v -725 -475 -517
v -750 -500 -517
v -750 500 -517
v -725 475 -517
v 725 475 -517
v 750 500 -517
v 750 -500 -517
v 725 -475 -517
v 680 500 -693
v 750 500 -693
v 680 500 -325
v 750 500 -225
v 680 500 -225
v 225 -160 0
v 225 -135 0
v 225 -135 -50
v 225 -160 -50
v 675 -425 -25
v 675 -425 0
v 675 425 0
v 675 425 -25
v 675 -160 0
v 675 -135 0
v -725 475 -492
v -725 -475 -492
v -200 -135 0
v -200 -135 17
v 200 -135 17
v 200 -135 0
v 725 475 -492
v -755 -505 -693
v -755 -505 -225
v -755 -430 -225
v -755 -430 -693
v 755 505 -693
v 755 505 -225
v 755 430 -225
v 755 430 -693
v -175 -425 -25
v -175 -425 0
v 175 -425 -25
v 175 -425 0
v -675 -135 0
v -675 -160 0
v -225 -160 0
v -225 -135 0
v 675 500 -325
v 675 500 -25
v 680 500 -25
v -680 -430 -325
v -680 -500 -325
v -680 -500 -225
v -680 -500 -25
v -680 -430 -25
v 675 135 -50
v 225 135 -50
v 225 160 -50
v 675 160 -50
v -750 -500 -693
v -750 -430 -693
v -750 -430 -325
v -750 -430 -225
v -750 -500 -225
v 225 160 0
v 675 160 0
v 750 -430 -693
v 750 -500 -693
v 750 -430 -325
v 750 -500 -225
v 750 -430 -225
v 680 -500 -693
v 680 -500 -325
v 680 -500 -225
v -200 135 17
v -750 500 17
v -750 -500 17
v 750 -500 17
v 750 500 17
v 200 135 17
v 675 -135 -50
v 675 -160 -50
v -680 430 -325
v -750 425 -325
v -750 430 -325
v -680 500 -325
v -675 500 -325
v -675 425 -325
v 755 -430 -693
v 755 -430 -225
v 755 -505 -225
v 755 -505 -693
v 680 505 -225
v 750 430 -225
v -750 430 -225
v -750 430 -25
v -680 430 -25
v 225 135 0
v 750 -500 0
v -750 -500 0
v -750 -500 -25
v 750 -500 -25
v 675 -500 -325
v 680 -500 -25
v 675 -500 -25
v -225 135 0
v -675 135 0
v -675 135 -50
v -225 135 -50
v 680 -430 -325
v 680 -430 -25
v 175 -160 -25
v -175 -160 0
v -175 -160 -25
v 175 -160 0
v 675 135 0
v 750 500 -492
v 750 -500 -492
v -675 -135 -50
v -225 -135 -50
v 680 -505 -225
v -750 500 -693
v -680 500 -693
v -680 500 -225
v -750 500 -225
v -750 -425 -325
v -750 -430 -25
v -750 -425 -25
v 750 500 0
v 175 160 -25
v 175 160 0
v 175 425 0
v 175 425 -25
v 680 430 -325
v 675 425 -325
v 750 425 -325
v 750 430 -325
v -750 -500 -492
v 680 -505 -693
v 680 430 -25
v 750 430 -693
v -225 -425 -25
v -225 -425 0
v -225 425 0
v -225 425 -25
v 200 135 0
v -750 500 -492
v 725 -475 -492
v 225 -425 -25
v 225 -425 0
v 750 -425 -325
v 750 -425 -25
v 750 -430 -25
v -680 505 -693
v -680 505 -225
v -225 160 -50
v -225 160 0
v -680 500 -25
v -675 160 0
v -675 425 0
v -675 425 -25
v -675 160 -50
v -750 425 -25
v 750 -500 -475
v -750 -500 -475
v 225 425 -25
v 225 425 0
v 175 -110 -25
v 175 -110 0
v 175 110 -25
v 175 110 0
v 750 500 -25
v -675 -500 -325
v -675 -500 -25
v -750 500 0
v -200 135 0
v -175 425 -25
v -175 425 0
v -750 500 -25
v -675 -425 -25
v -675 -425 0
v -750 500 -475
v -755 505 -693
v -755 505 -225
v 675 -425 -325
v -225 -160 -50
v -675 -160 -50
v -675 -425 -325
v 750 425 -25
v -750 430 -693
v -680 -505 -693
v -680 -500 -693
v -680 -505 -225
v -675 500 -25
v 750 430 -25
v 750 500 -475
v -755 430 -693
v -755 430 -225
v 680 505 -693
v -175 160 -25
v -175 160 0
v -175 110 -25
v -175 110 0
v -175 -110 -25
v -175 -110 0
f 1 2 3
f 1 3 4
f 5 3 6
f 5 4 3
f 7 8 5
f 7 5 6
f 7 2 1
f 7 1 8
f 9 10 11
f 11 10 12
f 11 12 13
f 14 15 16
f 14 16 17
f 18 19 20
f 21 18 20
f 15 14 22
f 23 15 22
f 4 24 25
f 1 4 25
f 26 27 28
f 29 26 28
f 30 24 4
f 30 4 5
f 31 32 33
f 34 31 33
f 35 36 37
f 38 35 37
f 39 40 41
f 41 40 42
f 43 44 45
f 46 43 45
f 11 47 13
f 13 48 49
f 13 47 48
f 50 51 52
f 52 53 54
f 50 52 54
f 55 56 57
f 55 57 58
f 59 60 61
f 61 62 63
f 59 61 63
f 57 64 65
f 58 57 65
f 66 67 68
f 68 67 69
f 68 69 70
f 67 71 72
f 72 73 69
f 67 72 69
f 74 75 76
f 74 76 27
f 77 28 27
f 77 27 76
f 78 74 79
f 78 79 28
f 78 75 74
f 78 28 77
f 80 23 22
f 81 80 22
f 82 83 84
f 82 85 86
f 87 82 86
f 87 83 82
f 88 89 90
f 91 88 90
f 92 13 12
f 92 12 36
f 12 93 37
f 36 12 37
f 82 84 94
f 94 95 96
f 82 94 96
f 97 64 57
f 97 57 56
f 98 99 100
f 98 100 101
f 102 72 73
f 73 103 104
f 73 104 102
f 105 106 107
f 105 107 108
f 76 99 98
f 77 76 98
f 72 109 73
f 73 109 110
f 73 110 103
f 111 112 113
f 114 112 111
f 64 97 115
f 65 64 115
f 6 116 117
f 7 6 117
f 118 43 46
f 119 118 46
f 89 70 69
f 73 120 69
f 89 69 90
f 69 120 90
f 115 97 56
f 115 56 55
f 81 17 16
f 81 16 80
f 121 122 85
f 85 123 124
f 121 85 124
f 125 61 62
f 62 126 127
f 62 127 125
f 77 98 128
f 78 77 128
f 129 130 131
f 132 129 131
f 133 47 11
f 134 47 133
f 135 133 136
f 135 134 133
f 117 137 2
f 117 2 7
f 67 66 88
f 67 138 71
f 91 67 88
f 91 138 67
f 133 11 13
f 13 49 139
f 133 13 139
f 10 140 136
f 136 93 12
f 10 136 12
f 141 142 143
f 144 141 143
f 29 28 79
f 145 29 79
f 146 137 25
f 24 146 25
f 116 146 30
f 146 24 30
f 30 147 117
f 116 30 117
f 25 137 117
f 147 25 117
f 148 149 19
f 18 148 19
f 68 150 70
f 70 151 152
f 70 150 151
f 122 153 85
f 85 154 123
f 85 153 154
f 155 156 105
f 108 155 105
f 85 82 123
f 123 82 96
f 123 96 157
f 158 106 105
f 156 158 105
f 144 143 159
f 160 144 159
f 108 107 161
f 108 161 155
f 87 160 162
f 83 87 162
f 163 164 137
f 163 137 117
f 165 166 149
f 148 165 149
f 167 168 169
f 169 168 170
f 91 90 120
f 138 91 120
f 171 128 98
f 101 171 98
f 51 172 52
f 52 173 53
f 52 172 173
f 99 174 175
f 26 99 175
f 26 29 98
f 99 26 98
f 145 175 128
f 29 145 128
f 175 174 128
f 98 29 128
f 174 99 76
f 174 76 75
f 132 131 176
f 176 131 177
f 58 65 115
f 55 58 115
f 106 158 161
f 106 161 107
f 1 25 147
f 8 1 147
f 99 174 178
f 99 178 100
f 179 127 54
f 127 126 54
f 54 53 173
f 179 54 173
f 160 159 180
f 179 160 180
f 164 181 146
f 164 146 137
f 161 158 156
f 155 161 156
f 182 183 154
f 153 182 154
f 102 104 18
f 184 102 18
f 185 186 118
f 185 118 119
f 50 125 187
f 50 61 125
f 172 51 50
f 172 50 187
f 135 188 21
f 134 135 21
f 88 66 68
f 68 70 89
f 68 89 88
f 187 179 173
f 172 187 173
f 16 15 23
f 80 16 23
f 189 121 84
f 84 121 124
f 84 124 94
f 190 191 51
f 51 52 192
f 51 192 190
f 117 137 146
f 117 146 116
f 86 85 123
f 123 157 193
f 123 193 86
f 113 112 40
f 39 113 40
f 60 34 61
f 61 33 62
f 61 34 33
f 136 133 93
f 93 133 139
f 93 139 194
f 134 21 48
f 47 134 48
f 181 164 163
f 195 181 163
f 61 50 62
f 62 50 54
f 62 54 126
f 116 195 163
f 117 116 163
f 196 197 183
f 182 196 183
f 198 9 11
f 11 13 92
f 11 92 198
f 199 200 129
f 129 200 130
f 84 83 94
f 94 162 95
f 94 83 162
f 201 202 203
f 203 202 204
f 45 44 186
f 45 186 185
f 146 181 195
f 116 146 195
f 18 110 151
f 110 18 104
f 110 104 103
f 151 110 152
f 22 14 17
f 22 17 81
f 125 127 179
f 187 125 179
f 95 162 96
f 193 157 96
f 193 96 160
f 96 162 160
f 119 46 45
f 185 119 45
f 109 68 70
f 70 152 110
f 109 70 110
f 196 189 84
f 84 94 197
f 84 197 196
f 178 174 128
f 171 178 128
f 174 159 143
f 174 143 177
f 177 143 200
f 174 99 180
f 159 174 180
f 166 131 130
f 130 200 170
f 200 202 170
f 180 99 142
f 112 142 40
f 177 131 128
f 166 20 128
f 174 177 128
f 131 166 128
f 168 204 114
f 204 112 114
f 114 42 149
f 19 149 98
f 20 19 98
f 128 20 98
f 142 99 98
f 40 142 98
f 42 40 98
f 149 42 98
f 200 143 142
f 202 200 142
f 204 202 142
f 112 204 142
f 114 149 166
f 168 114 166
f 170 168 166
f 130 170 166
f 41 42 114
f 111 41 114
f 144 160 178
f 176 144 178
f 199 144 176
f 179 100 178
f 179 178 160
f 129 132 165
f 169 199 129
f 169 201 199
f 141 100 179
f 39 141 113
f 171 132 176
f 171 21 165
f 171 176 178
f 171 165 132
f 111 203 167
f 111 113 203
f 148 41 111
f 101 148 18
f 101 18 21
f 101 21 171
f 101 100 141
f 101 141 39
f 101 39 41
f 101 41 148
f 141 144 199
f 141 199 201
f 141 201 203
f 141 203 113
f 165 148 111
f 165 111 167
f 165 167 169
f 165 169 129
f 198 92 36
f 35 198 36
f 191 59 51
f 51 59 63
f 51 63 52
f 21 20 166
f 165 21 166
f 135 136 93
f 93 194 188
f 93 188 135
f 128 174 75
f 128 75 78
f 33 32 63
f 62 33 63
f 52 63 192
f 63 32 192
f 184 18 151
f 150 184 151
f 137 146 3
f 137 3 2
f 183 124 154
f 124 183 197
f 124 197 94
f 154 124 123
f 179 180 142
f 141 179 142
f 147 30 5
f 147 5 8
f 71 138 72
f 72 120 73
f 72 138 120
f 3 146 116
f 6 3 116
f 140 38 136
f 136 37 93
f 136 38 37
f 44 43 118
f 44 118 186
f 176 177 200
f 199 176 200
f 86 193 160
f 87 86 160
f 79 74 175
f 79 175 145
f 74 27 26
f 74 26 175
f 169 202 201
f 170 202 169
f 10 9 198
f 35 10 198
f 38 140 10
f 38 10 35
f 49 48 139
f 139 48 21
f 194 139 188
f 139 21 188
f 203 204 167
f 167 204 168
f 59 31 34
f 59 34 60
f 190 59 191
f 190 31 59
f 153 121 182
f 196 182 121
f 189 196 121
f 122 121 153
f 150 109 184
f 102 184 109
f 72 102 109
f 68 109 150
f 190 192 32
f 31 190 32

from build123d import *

# Parameters (mm, degrees)
F0_W      = 1500
F0_H      = 1000
F1_DEPTH  = 17
F2_W      = 1500
F2_H      = 1000
F2_W_2    = 350
F2_H_2    = 50
F3_DEPTH  = 25
F2_W_3    = 450
F2_H_3    = 25
F4_DEPTH  = 50
F5_W      = 400
F5_H      = 270
F6_DEPTH  = 17
F8_DEPTH  = 300
F11_DEPTH = 468
F13_W     = 1500
F13_H     = 1000
F14_DEPTH = 17
F15_W     = 1500
F15_H     = 1000
F15_W_2   = 1450
F15_H_2   = 950
F16_DEPTH = 25


with BuildPart() as f1:
    # F0 (on Top) → F1 (new body)
    with BuildSketch(Plane.XY):
        Rectangle(F0_W, F0_H)
    extrude(amount=F1_DEPTH)

    # F5 (on face) → F6 (cut, through all)
    with BuildSketch(Plane.XY.offset(17)):
        Rectangle(F5_W, F5_H)
    extrude(amount=-F6_DEPTH, mode=Mode.SUBTRACT)


with BuildPart() as f3:
    # F2 (on face) → F3 (new body)
    with BuildSketch(Plane(origin=(0, 0, 0), x_dir=(1, 0, 0), z_dir=(0, 0, -1))):
        Rectangle(F2_W, F2_H)
        Polygon((225, 425), (675, 425), (675, 160), (675, 135), (675, -135), (675, -160), (675, -425), (225, -425), (175, -425), (-175, -425), (-225, -425), (-675, -425), (-675, -160), (-675, -135), (-675, 135), (-675, 160), (-675, 425), (-225, 425), (-175, 425), (175, 425), align=None, mode=Mode.SUBTRACT)
        Polygon((-175, 160), (-175, 425), (-225, 425), (-225, 160), (-225, 135), (-225, -135), (-225, -160), (-225, -425), (-175, -425), (-175, -160), (-175, -110), (-175, 110), align=None)
        Polygon((225, 160), (225, 425), (175, 425), (175, 160), (175, 110), (175, -110), (175, -160), (175, -425), (225, -425), (225, -160), (225, -135), (225, 135), align=None)
        with Locations((0, 135)):
            Rectangle(F2_W_2, F2_H_2)
        with Locations((0, -135)):
            Rectangle(F2_W_2, F2_H_2)
    extrude(amount=F3_DEPTH)


with BuildPart() as f4:
    # F2 (on face) → F4 (new body)
    with BuildSketch(Plane(origin=(0, 0, 0), x_dir=(1, 0, 0), z_dir=(0, 0, -1))):
        with Locations((-450, 147.5)):
            Rectangle(F2_W_3, F2_H_3)
    extrude(amount=F4_DEPTH)


with BuildPart() as f4b:
    # F2 (on face) → F4, piece 2 (new body)
    with BuildSketch(Plane(origin=(0, 0, 0), x_dir=(1, 0, 0), z_dir=(0, 0, -1))):
        with Locations((-450, -147.5)):
            Rectangle(F2_W_3, F2_H_3)
    extrude(amount=F4_DEPTH)


with BuildPart() as f4c:
    # F2 (on face) → F4, piece 3 (new body)
    with BuildSketch(Plane(origin=(0, 0, 0), x_dir=(1, 0, 0), z_dir=(0, 0, -1))):
        with Locations((450, 147.5)):
            Rectangle(F2_W_3, F2_H_3)
    extrude(amount=F4_DEPTH)


with BuildPart() as f4d:
    # F2 (on face) → F4, piece 4 (new body)
    with BuildSketch(Plane(origin=(0, 0, 0), x_dir=(1, 0, 0), z_dir=(0, 0, -1))):
        with Locations((450, -147.5)):
            Rectangle(F2_W_3, F2_H_3)
    extrude(amount=F4_DEPTH)


with BuildPart() as f8:
    # F7 (on face) → F8 (new body)
    with BuildSketch(Plane(origin=(0, 0, -25), x_dir=(1, 0, 0), z_dir=(0, 0, -1))):
        Polygon((-675, -500), (-675, -425), (-750, -425), (-750, -430), (-680, -430), (-680, -500), align=None)
        Polygon((-750, 425), (-675, 425), (-675, 500), (-680.0000071526, 500), (-680.0000071526, 430.0000071526), (-750, 430.0000071526), align=None)
        Polygon((680, 500), (675, 500), (675, 425), (750, 425), (750, 430), (680, 430), align=None)
        Polygon((675, -425), (675, -500), (680.0000071526, -500), (680.0000071526, -430.0000071526), (750, -430.0000071526), (750, -425), align=None)
    extrude(amount=F8_DEPTH)

    # F10 (on offset) → F11 (join)
    with BuildSketch(Plane(origin=(0, 0, -225), x_dir=(1, 0, 0), z_dir=(0, 0, -1))):
        Polygon((755, -430.0000071526), (750, -430.0000071526), (750, -500), (680.0000071526, -500), (680.0000071526, -505), (755, -505), align=None)
        Polygon((750, 500), (750, 430), (755, 430), (755, 505), (680, 505), (680, 500), align=None)
        Polygon((-750, 500), (-680.0000071526, 500), (-680.0000071526, 505), (-755, 505), (-755, 430.0000071526), (-750, 430.0000071526), align=None)
        Polygon((-750, -500), (-750, -430), (-755, -430), (-755, -505), (-680, -505), (-680, -500), align=None)
    extrude(amount=F11_DEPTH)


with BuildPart() as f14:
    # F13 (on offset) → F14 (new body)
    with BuildSketch(Plane(origin=(0, 0, -475), x_dir=(1, 0, 0), z_dir=(0, 0, -1))):
        Rectangle(F13_W, F13_H)
    extrude(amount=F14_DEPTH)


with BuildPart() as f16:
    # F15 (on face) → F16 (new body)
    with BuildSketch(Plane(origin=(0, 0, -492), x_dir=(1, 0, 0), z_dir=(0, 0, -1))):
        Rectangle(F15_W, F15_H)
        Rectangle(F15_W_2, F15_H_2, mode=Mode.SUBTRACT)
    extrude(amount=F16_DEPTH)


solid = Compound([f1.part, f3.part, f4.part, f4b.part, f4c.part, f4d.part, f8.part, f14.part, f16.part])
